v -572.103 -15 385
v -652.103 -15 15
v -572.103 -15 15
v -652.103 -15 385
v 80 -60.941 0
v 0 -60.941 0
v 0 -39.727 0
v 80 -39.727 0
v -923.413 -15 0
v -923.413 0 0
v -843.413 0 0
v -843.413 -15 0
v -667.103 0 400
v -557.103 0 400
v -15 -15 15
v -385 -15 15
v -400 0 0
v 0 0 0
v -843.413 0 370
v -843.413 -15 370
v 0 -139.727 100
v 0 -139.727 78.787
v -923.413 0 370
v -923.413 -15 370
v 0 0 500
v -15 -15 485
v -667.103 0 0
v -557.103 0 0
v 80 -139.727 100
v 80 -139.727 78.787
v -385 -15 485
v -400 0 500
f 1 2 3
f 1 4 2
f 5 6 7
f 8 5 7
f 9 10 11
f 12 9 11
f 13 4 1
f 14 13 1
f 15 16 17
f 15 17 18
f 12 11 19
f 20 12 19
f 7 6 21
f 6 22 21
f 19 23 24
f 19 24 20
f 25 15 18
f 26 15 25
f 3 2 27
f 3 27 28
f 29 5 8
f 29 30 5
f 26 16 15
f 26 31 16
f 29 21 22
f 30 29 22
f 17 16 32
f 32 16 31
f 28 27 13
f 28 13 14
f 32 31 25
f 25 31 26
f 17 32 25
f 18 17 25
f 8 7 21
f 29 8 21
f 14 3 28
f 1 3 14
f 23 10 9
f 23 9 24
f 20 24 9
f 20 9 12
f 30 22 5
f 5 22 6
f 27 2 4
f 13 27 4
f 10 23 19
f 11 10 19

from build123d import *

# Parameters (mm, degrees)
F0_W      = 400
F0_H      = 500
F1_DEPTH  = 15
F2_W      = 110
F2_H      = 400
F3_DEPTH  = 15
F4_SIZE   = 14.99999
F4_2_SIZE = 14.99999
F5_W      = 80
F5_H      = 370
F6_DEPTH  = 15
F8_DEPTH  = 80


# Not quite as in the source:
# - a fillet or chamfer is up to 0.001 mm smaller than in the source, because OpenCascade refuses the exact size


with BuildPart() as f1:
    # F0 (on Front) → F1 (new body)
    with BuildSketch(Plane.XZ):
        with Locations((-200, 250)):
            Rectangle(F0_W, F0_H)
    extrude(amount=F1_DEPTH)

    # F4 (size 15 in the source; OpenCascade refuses exactly that, so slightly less here)
    f4_edges = [f1.edges().sort_by_distance(p)[0] for p in [
        (-200, -15, 0),
        (0, -15, 250),
        (-200, -15, 500),
        (-400, -15, 250),
    ]]
    chamfer(f4_edges, length=F4_SIZE)


with BuildPart() as f3:
    # F2 (on Front) → F3 (new body)
    with BuildSketch(Plane.XZ):
        with Locations((-612.1029348396, 200)):
            Rectangle(F2_W, F2_H)
    extrude(amount=F3_DEPTH)

    # F4#2 (size 15 in the source; OpenCascade refuses exactly that, so slightly less here)
    f4_2_edges = [f3.edges().sort_by_distance(p)[0] for p in [
        (-612.102935, -15, 0),
        (-557.102935, -15, 200),
        (-612.102935, -15, 400),
        (-667.102935, -15, 200),
    ]]
    chamfer(f4_2_edges, length=F4_2_SIZE)


with BuildPart() as f6:
    # F5 (on Front) → F6 (new body)
    with BuildSketch(Plane.XZ):
        with Locations((-883.413142176, 185)):
            Rectangle(F5_W, F5_H)
    extrude(amount=F6_DEPTH)


with BuildPart() as f8:
    # F7 (on Right) → F8 (new body)
    with BuildSketch(Plane.YZ):
        Polygon((-60.940527683, 0), (-39.7273242474, 0), (-139.7273242474, 100), (-139.7273242474, 78.7867965644), align=None)
    extrude(amount=F8_DEPTH)


solid = Compound([f1.part, f3.part, f6.part, f8.part])
